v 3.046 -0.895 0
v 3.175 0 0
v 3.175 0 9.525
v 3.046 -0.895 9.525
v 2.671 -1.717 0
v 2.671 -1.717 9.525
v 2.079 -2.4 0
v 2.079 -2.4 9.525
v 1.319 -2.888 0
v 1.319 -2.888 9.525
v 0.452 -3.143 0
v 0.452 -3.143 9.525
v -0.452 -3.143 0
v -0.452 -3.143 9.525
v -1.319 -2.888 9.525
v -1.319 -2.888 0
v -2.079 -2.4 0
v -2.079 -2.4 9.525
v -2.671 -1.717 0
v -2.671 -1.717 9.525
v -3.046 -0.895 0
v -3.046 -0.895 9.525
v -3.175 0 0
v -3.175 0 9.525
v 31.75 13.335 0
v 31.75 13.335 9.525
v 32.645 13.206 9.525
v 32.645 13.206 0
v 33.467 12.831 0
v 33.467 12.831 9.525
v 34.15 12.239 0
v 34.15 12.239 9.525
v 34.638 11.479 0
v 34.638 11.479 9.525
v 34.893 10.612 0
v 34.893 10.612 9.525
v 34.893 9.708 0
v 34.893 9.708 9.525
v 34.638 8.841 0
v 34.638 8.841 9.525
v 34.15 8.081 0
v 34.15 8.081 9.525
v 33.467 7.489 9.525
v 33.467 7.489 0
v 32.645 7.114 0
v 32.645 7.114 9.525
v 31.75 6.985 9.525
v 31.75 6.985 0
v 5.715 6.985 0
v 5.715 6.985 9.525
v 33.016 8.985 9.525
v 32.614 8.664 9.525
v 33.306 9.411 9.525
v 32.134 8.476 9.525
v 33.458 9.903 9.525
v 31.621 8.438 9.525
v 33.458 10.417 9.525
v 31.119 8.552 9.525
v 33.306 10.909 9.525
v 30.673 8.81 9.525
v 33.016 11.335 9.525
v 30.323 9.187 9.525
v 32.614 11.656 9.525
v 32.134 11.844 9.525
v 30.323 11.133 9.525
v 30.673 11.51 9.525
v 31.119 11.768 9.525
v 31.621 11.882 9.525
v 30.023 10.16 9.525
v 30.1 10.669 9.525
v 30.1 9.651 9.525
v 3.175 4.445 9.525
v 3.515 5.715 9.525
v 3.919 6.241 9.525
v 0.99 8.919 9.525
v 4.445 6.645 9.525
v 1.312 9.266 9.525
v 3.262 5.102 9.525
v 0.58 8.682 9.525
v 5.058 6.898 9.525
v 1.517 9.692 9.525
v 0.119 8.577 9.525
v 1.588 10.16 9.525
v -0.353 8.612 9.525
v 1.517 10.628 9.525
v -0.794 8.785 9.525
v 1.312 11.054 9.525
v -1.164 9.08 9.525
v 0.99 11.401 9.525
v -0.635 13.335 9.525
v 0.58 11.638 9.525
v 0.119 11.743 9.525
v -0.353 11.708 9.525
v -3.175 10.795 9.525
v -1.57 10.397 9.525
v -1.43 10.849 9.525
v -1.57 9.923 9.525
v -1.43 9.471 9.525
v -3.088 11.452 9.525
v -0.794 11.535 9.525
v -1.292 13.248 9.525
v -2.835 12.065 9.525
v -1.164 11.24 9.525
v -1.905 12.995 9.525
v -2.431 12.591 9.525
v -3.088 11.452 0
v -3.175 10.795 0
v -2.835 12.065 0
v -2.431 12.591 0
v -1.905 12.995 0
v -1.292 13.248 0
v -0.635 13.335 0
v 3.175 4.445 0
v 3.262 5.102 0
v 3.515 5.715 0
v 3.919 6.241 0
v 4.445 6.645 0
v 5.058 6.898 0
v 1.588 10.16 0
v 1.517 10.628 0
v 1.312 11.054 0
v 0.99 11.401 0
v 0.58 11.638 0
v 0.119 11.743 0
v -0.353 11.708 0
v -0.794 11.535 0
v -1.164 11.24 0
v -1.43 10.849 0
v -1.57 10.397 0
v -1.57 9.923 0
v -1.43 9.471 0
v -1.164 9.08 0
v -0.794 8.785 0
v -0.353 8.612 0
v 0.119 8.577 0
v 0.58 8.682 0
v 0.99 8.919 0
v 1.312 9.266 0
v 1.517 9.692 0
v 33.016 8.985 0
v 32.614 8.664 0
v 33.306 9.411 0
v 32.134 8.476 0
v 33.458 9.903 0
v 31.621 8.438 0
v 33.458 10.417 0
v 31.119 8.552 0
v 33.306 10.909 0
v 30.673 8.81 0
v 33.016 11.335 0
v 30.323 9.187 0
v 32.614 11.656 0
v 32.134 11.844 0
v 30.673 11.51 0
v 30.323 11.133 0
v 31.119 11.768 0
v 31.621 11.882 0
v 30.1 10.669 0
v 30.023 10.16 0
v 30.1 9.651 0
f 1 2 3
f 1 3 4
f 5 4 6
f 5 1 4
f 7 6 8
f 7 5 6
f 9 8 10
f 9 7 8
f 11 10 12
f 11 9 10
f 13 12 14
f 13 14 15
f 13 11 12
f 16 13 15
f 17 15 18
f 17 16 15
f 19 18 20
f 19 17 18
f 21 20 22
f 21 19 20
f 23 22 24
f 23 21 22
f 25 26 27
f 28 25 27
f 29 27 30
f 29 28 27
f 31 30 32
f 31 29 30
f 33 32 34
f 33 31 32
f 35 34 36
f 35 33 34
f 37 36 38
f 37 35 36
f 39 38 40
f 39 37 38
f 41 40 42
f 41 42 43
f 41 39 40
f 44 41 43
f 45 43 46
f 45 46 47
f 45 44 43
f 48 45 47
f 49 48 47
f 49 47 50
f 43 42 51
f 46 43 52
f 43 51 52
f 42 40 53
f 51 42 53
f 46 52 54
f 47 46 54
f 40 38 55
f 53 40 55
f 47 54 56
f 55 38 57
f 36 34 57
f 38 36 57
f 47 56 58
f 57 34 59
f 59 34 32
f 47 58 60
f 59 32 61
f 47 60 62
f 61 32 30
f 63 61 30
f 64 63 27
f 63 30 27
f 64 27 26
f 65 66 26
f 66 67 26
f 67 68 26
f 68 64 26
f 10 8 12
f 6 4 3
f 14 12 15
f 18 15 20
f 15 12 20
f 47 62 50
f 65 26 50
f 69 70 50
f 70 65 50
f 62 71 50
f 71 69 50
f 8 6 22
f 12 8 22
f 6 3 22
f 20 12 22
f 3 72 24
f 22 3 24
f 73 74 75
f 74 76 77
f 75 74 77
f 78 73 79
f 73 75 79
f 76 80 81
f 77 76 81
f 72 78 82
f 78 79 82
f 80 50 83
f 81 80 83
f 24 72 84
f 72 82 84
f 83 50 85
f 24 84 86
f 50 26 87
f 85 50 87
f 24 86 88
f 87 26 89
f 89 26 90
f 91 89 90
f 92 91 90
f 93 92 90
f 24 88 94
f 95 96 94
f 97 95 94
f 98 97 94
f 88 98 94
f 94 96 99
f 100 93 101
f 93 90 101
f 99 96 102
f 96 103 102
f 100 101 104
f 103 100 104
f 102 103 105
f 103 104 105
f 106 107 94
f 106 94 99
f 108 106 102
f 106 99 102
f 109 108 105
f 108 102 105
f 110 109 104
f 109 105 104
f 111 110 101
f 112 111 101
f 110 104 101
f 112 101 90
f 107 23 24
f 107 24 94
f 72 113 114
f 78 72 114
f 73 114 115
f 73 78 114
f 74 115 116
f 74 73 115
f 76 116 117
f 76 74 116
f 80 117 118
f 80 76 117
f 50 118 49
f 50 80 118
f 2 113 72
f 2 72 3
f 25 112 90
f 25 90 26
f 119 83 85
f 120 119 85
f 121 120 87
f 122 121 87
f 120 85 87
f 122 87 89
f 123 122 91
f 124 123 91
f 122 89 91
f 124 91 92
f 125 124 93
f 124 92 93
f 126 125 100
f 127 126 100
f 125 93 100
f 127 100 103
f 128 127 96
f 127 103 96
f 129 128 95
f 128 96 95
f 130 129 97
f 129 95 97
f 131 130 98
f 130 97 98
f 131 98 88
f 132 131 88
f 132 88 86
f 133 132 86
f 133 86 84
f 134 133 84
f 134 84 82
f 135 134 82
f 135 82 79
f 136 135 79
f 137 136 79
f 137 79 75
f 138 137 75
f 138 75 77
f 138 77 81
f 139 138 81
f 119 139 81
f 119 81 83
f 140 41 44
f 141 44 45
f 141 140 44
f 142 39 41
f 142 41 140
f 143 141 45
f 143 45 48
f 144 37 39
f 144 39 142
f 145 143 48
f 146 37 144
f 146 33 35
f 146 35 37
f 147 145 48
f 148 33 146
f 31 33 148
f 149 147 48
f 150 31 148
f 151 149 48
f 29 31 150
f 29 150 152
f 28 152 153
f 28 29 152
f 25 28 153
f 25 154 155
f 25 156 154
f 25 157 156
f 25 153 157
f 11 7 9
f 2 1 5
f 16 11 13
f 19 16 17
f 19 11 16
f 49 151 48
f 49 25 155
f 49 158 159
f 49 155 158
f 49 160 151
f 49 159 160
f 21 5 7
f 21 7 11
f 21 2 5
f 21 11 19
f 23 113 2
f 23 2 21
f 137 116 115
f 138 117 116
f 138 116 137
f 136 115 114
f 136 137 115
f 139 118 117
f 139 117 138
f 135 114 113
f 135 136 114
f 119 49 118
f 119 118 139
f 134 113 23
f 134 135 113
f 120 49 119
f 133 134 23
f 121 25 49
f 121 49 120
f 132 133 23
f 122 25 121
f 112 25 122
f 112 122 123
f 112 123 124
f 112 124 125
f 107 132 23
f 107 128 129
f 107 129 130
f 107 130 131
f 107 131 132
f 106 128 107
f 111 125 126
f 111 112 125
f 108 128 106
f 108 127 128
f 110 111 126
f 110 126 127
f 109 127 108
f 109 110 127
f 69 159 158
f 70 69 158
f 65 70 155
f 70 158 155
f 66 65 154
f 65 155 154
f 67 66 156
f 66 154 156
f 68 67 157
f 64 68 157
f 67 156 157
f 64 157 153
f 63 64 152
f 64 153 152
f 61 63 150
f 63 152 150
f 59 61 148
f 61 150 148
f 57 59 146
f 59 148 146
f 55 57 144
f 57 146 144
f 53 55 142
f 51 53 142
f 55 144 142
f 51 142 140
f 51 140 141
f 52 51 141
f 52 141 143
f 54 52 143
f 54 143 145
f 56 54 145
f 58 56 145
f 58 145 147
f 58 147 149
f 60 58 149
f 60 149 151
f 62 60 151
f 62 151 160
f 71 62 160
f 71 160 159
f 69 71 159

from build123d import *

# Parameters (mm, degrees)
BOSS_EXTRUDE1_DEPTH   = 9.525
FILLET1_R             = 2.54
SKETCH5_R             = 1.5875
CUT_EXTRUDE1_DEPTH    = 39.578536455
F_8_32_TAPPED_HOLE1_D = 3.4544


with BuildPart() as part:
    # Sketch1 → Boss-Extrude1 (new body)
    with BuildSketch(Plane.XY):
        with BuildLine():
            Line((3.175, 6.985), (3.175, 0))
            ThreePointArc((3.175, 0), (0, -3.175), (-3.175, 0))
            Line((-3.175, 0), (-3.175, 13.335))
            Line((-3.175, 13.335), (31.75, 13.335))
            ThreePointArc((31.75, 13.335), (34.925, 10.16), (31.75, 6.985))
            Line((31.75, 6.985), (3.175, 6.985))
        make_face()
    extrude(amount=BOSS_EXTRUDE1_DEPTH)

    # Fillet1
    fillet1_edges = [part.edges().sort_by_distance(p)[0] for p in [
        (3.175, 6.985, 4.7625),
        (-3.175, 13.335, 4.7625),
    ]]
    fillet(fillet1_edges, radius=FILLET1_R)

    # Sketch5 → Cut-Extrude1 (cut, through all)
    with BuildSketch(Plane.XY.offset(9.525)):
        with Locations((0, 10.16)):
            Circle(SKETCH5_R)
    extrude(amount=-CUT_EXTRUDE1_DEPTH, mode=Mode.SUBTRACT)

    # #8-32 Tapped Hole1 (through all)
    with Locations(Plane.XY.offset(9.525)):
        with Locations((31.75, 10.16)):
            Hole(F_8_32_TAPPED_HOLE1_D / 2)


solid = part.part
